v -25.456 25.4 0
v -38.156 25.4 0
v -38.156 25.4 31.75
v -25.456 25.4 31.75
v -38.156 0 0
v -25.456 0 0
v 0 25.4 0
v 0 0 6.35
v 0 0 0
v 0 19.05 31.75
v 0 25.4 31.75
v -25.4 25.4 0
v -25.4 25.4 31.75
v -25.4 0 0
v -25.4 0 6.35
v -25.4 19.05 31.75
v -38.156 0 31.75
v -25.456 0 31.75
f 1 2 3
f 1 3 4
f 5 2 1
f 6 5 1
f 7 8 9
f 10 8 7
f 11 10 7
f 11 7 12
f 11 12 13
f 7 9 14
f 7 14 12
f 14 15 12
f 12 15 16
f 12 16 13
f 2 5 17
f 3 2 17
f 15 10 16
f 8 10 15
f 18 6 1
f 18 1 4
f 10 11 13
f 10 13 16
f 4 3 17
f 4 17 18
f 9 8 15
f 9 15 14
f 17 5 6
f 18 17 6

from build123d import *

# Parameters (mm, degrees)
F1_DEPTH = 25.4
F2_W     = 12.7
F2_H     = 31.75
F3_DEPTH = 25.4


with BuildPart() as f1:
    # F0 (on Right) → F1 (new body)
    with BuildSketch(Plane.YZ):
        Polygon((0, 6.35), (0, 0), (25.4, 0), (25.4, 31.75), (19.05, 31.75), align=None)
    extrude(amount=-F1_DEPTH)


with BuildPart() as f3:
    # F2 (on Front) → F3 (new body)
    with BuildSketch(Plane.XZ):
        with Locations((-31.805623, 15.875)):
            Rectangle(F2_W, F2_H)
    extrude(amount=-F3_DEPTH)


solid = Compound([f1.part, f3.part])
